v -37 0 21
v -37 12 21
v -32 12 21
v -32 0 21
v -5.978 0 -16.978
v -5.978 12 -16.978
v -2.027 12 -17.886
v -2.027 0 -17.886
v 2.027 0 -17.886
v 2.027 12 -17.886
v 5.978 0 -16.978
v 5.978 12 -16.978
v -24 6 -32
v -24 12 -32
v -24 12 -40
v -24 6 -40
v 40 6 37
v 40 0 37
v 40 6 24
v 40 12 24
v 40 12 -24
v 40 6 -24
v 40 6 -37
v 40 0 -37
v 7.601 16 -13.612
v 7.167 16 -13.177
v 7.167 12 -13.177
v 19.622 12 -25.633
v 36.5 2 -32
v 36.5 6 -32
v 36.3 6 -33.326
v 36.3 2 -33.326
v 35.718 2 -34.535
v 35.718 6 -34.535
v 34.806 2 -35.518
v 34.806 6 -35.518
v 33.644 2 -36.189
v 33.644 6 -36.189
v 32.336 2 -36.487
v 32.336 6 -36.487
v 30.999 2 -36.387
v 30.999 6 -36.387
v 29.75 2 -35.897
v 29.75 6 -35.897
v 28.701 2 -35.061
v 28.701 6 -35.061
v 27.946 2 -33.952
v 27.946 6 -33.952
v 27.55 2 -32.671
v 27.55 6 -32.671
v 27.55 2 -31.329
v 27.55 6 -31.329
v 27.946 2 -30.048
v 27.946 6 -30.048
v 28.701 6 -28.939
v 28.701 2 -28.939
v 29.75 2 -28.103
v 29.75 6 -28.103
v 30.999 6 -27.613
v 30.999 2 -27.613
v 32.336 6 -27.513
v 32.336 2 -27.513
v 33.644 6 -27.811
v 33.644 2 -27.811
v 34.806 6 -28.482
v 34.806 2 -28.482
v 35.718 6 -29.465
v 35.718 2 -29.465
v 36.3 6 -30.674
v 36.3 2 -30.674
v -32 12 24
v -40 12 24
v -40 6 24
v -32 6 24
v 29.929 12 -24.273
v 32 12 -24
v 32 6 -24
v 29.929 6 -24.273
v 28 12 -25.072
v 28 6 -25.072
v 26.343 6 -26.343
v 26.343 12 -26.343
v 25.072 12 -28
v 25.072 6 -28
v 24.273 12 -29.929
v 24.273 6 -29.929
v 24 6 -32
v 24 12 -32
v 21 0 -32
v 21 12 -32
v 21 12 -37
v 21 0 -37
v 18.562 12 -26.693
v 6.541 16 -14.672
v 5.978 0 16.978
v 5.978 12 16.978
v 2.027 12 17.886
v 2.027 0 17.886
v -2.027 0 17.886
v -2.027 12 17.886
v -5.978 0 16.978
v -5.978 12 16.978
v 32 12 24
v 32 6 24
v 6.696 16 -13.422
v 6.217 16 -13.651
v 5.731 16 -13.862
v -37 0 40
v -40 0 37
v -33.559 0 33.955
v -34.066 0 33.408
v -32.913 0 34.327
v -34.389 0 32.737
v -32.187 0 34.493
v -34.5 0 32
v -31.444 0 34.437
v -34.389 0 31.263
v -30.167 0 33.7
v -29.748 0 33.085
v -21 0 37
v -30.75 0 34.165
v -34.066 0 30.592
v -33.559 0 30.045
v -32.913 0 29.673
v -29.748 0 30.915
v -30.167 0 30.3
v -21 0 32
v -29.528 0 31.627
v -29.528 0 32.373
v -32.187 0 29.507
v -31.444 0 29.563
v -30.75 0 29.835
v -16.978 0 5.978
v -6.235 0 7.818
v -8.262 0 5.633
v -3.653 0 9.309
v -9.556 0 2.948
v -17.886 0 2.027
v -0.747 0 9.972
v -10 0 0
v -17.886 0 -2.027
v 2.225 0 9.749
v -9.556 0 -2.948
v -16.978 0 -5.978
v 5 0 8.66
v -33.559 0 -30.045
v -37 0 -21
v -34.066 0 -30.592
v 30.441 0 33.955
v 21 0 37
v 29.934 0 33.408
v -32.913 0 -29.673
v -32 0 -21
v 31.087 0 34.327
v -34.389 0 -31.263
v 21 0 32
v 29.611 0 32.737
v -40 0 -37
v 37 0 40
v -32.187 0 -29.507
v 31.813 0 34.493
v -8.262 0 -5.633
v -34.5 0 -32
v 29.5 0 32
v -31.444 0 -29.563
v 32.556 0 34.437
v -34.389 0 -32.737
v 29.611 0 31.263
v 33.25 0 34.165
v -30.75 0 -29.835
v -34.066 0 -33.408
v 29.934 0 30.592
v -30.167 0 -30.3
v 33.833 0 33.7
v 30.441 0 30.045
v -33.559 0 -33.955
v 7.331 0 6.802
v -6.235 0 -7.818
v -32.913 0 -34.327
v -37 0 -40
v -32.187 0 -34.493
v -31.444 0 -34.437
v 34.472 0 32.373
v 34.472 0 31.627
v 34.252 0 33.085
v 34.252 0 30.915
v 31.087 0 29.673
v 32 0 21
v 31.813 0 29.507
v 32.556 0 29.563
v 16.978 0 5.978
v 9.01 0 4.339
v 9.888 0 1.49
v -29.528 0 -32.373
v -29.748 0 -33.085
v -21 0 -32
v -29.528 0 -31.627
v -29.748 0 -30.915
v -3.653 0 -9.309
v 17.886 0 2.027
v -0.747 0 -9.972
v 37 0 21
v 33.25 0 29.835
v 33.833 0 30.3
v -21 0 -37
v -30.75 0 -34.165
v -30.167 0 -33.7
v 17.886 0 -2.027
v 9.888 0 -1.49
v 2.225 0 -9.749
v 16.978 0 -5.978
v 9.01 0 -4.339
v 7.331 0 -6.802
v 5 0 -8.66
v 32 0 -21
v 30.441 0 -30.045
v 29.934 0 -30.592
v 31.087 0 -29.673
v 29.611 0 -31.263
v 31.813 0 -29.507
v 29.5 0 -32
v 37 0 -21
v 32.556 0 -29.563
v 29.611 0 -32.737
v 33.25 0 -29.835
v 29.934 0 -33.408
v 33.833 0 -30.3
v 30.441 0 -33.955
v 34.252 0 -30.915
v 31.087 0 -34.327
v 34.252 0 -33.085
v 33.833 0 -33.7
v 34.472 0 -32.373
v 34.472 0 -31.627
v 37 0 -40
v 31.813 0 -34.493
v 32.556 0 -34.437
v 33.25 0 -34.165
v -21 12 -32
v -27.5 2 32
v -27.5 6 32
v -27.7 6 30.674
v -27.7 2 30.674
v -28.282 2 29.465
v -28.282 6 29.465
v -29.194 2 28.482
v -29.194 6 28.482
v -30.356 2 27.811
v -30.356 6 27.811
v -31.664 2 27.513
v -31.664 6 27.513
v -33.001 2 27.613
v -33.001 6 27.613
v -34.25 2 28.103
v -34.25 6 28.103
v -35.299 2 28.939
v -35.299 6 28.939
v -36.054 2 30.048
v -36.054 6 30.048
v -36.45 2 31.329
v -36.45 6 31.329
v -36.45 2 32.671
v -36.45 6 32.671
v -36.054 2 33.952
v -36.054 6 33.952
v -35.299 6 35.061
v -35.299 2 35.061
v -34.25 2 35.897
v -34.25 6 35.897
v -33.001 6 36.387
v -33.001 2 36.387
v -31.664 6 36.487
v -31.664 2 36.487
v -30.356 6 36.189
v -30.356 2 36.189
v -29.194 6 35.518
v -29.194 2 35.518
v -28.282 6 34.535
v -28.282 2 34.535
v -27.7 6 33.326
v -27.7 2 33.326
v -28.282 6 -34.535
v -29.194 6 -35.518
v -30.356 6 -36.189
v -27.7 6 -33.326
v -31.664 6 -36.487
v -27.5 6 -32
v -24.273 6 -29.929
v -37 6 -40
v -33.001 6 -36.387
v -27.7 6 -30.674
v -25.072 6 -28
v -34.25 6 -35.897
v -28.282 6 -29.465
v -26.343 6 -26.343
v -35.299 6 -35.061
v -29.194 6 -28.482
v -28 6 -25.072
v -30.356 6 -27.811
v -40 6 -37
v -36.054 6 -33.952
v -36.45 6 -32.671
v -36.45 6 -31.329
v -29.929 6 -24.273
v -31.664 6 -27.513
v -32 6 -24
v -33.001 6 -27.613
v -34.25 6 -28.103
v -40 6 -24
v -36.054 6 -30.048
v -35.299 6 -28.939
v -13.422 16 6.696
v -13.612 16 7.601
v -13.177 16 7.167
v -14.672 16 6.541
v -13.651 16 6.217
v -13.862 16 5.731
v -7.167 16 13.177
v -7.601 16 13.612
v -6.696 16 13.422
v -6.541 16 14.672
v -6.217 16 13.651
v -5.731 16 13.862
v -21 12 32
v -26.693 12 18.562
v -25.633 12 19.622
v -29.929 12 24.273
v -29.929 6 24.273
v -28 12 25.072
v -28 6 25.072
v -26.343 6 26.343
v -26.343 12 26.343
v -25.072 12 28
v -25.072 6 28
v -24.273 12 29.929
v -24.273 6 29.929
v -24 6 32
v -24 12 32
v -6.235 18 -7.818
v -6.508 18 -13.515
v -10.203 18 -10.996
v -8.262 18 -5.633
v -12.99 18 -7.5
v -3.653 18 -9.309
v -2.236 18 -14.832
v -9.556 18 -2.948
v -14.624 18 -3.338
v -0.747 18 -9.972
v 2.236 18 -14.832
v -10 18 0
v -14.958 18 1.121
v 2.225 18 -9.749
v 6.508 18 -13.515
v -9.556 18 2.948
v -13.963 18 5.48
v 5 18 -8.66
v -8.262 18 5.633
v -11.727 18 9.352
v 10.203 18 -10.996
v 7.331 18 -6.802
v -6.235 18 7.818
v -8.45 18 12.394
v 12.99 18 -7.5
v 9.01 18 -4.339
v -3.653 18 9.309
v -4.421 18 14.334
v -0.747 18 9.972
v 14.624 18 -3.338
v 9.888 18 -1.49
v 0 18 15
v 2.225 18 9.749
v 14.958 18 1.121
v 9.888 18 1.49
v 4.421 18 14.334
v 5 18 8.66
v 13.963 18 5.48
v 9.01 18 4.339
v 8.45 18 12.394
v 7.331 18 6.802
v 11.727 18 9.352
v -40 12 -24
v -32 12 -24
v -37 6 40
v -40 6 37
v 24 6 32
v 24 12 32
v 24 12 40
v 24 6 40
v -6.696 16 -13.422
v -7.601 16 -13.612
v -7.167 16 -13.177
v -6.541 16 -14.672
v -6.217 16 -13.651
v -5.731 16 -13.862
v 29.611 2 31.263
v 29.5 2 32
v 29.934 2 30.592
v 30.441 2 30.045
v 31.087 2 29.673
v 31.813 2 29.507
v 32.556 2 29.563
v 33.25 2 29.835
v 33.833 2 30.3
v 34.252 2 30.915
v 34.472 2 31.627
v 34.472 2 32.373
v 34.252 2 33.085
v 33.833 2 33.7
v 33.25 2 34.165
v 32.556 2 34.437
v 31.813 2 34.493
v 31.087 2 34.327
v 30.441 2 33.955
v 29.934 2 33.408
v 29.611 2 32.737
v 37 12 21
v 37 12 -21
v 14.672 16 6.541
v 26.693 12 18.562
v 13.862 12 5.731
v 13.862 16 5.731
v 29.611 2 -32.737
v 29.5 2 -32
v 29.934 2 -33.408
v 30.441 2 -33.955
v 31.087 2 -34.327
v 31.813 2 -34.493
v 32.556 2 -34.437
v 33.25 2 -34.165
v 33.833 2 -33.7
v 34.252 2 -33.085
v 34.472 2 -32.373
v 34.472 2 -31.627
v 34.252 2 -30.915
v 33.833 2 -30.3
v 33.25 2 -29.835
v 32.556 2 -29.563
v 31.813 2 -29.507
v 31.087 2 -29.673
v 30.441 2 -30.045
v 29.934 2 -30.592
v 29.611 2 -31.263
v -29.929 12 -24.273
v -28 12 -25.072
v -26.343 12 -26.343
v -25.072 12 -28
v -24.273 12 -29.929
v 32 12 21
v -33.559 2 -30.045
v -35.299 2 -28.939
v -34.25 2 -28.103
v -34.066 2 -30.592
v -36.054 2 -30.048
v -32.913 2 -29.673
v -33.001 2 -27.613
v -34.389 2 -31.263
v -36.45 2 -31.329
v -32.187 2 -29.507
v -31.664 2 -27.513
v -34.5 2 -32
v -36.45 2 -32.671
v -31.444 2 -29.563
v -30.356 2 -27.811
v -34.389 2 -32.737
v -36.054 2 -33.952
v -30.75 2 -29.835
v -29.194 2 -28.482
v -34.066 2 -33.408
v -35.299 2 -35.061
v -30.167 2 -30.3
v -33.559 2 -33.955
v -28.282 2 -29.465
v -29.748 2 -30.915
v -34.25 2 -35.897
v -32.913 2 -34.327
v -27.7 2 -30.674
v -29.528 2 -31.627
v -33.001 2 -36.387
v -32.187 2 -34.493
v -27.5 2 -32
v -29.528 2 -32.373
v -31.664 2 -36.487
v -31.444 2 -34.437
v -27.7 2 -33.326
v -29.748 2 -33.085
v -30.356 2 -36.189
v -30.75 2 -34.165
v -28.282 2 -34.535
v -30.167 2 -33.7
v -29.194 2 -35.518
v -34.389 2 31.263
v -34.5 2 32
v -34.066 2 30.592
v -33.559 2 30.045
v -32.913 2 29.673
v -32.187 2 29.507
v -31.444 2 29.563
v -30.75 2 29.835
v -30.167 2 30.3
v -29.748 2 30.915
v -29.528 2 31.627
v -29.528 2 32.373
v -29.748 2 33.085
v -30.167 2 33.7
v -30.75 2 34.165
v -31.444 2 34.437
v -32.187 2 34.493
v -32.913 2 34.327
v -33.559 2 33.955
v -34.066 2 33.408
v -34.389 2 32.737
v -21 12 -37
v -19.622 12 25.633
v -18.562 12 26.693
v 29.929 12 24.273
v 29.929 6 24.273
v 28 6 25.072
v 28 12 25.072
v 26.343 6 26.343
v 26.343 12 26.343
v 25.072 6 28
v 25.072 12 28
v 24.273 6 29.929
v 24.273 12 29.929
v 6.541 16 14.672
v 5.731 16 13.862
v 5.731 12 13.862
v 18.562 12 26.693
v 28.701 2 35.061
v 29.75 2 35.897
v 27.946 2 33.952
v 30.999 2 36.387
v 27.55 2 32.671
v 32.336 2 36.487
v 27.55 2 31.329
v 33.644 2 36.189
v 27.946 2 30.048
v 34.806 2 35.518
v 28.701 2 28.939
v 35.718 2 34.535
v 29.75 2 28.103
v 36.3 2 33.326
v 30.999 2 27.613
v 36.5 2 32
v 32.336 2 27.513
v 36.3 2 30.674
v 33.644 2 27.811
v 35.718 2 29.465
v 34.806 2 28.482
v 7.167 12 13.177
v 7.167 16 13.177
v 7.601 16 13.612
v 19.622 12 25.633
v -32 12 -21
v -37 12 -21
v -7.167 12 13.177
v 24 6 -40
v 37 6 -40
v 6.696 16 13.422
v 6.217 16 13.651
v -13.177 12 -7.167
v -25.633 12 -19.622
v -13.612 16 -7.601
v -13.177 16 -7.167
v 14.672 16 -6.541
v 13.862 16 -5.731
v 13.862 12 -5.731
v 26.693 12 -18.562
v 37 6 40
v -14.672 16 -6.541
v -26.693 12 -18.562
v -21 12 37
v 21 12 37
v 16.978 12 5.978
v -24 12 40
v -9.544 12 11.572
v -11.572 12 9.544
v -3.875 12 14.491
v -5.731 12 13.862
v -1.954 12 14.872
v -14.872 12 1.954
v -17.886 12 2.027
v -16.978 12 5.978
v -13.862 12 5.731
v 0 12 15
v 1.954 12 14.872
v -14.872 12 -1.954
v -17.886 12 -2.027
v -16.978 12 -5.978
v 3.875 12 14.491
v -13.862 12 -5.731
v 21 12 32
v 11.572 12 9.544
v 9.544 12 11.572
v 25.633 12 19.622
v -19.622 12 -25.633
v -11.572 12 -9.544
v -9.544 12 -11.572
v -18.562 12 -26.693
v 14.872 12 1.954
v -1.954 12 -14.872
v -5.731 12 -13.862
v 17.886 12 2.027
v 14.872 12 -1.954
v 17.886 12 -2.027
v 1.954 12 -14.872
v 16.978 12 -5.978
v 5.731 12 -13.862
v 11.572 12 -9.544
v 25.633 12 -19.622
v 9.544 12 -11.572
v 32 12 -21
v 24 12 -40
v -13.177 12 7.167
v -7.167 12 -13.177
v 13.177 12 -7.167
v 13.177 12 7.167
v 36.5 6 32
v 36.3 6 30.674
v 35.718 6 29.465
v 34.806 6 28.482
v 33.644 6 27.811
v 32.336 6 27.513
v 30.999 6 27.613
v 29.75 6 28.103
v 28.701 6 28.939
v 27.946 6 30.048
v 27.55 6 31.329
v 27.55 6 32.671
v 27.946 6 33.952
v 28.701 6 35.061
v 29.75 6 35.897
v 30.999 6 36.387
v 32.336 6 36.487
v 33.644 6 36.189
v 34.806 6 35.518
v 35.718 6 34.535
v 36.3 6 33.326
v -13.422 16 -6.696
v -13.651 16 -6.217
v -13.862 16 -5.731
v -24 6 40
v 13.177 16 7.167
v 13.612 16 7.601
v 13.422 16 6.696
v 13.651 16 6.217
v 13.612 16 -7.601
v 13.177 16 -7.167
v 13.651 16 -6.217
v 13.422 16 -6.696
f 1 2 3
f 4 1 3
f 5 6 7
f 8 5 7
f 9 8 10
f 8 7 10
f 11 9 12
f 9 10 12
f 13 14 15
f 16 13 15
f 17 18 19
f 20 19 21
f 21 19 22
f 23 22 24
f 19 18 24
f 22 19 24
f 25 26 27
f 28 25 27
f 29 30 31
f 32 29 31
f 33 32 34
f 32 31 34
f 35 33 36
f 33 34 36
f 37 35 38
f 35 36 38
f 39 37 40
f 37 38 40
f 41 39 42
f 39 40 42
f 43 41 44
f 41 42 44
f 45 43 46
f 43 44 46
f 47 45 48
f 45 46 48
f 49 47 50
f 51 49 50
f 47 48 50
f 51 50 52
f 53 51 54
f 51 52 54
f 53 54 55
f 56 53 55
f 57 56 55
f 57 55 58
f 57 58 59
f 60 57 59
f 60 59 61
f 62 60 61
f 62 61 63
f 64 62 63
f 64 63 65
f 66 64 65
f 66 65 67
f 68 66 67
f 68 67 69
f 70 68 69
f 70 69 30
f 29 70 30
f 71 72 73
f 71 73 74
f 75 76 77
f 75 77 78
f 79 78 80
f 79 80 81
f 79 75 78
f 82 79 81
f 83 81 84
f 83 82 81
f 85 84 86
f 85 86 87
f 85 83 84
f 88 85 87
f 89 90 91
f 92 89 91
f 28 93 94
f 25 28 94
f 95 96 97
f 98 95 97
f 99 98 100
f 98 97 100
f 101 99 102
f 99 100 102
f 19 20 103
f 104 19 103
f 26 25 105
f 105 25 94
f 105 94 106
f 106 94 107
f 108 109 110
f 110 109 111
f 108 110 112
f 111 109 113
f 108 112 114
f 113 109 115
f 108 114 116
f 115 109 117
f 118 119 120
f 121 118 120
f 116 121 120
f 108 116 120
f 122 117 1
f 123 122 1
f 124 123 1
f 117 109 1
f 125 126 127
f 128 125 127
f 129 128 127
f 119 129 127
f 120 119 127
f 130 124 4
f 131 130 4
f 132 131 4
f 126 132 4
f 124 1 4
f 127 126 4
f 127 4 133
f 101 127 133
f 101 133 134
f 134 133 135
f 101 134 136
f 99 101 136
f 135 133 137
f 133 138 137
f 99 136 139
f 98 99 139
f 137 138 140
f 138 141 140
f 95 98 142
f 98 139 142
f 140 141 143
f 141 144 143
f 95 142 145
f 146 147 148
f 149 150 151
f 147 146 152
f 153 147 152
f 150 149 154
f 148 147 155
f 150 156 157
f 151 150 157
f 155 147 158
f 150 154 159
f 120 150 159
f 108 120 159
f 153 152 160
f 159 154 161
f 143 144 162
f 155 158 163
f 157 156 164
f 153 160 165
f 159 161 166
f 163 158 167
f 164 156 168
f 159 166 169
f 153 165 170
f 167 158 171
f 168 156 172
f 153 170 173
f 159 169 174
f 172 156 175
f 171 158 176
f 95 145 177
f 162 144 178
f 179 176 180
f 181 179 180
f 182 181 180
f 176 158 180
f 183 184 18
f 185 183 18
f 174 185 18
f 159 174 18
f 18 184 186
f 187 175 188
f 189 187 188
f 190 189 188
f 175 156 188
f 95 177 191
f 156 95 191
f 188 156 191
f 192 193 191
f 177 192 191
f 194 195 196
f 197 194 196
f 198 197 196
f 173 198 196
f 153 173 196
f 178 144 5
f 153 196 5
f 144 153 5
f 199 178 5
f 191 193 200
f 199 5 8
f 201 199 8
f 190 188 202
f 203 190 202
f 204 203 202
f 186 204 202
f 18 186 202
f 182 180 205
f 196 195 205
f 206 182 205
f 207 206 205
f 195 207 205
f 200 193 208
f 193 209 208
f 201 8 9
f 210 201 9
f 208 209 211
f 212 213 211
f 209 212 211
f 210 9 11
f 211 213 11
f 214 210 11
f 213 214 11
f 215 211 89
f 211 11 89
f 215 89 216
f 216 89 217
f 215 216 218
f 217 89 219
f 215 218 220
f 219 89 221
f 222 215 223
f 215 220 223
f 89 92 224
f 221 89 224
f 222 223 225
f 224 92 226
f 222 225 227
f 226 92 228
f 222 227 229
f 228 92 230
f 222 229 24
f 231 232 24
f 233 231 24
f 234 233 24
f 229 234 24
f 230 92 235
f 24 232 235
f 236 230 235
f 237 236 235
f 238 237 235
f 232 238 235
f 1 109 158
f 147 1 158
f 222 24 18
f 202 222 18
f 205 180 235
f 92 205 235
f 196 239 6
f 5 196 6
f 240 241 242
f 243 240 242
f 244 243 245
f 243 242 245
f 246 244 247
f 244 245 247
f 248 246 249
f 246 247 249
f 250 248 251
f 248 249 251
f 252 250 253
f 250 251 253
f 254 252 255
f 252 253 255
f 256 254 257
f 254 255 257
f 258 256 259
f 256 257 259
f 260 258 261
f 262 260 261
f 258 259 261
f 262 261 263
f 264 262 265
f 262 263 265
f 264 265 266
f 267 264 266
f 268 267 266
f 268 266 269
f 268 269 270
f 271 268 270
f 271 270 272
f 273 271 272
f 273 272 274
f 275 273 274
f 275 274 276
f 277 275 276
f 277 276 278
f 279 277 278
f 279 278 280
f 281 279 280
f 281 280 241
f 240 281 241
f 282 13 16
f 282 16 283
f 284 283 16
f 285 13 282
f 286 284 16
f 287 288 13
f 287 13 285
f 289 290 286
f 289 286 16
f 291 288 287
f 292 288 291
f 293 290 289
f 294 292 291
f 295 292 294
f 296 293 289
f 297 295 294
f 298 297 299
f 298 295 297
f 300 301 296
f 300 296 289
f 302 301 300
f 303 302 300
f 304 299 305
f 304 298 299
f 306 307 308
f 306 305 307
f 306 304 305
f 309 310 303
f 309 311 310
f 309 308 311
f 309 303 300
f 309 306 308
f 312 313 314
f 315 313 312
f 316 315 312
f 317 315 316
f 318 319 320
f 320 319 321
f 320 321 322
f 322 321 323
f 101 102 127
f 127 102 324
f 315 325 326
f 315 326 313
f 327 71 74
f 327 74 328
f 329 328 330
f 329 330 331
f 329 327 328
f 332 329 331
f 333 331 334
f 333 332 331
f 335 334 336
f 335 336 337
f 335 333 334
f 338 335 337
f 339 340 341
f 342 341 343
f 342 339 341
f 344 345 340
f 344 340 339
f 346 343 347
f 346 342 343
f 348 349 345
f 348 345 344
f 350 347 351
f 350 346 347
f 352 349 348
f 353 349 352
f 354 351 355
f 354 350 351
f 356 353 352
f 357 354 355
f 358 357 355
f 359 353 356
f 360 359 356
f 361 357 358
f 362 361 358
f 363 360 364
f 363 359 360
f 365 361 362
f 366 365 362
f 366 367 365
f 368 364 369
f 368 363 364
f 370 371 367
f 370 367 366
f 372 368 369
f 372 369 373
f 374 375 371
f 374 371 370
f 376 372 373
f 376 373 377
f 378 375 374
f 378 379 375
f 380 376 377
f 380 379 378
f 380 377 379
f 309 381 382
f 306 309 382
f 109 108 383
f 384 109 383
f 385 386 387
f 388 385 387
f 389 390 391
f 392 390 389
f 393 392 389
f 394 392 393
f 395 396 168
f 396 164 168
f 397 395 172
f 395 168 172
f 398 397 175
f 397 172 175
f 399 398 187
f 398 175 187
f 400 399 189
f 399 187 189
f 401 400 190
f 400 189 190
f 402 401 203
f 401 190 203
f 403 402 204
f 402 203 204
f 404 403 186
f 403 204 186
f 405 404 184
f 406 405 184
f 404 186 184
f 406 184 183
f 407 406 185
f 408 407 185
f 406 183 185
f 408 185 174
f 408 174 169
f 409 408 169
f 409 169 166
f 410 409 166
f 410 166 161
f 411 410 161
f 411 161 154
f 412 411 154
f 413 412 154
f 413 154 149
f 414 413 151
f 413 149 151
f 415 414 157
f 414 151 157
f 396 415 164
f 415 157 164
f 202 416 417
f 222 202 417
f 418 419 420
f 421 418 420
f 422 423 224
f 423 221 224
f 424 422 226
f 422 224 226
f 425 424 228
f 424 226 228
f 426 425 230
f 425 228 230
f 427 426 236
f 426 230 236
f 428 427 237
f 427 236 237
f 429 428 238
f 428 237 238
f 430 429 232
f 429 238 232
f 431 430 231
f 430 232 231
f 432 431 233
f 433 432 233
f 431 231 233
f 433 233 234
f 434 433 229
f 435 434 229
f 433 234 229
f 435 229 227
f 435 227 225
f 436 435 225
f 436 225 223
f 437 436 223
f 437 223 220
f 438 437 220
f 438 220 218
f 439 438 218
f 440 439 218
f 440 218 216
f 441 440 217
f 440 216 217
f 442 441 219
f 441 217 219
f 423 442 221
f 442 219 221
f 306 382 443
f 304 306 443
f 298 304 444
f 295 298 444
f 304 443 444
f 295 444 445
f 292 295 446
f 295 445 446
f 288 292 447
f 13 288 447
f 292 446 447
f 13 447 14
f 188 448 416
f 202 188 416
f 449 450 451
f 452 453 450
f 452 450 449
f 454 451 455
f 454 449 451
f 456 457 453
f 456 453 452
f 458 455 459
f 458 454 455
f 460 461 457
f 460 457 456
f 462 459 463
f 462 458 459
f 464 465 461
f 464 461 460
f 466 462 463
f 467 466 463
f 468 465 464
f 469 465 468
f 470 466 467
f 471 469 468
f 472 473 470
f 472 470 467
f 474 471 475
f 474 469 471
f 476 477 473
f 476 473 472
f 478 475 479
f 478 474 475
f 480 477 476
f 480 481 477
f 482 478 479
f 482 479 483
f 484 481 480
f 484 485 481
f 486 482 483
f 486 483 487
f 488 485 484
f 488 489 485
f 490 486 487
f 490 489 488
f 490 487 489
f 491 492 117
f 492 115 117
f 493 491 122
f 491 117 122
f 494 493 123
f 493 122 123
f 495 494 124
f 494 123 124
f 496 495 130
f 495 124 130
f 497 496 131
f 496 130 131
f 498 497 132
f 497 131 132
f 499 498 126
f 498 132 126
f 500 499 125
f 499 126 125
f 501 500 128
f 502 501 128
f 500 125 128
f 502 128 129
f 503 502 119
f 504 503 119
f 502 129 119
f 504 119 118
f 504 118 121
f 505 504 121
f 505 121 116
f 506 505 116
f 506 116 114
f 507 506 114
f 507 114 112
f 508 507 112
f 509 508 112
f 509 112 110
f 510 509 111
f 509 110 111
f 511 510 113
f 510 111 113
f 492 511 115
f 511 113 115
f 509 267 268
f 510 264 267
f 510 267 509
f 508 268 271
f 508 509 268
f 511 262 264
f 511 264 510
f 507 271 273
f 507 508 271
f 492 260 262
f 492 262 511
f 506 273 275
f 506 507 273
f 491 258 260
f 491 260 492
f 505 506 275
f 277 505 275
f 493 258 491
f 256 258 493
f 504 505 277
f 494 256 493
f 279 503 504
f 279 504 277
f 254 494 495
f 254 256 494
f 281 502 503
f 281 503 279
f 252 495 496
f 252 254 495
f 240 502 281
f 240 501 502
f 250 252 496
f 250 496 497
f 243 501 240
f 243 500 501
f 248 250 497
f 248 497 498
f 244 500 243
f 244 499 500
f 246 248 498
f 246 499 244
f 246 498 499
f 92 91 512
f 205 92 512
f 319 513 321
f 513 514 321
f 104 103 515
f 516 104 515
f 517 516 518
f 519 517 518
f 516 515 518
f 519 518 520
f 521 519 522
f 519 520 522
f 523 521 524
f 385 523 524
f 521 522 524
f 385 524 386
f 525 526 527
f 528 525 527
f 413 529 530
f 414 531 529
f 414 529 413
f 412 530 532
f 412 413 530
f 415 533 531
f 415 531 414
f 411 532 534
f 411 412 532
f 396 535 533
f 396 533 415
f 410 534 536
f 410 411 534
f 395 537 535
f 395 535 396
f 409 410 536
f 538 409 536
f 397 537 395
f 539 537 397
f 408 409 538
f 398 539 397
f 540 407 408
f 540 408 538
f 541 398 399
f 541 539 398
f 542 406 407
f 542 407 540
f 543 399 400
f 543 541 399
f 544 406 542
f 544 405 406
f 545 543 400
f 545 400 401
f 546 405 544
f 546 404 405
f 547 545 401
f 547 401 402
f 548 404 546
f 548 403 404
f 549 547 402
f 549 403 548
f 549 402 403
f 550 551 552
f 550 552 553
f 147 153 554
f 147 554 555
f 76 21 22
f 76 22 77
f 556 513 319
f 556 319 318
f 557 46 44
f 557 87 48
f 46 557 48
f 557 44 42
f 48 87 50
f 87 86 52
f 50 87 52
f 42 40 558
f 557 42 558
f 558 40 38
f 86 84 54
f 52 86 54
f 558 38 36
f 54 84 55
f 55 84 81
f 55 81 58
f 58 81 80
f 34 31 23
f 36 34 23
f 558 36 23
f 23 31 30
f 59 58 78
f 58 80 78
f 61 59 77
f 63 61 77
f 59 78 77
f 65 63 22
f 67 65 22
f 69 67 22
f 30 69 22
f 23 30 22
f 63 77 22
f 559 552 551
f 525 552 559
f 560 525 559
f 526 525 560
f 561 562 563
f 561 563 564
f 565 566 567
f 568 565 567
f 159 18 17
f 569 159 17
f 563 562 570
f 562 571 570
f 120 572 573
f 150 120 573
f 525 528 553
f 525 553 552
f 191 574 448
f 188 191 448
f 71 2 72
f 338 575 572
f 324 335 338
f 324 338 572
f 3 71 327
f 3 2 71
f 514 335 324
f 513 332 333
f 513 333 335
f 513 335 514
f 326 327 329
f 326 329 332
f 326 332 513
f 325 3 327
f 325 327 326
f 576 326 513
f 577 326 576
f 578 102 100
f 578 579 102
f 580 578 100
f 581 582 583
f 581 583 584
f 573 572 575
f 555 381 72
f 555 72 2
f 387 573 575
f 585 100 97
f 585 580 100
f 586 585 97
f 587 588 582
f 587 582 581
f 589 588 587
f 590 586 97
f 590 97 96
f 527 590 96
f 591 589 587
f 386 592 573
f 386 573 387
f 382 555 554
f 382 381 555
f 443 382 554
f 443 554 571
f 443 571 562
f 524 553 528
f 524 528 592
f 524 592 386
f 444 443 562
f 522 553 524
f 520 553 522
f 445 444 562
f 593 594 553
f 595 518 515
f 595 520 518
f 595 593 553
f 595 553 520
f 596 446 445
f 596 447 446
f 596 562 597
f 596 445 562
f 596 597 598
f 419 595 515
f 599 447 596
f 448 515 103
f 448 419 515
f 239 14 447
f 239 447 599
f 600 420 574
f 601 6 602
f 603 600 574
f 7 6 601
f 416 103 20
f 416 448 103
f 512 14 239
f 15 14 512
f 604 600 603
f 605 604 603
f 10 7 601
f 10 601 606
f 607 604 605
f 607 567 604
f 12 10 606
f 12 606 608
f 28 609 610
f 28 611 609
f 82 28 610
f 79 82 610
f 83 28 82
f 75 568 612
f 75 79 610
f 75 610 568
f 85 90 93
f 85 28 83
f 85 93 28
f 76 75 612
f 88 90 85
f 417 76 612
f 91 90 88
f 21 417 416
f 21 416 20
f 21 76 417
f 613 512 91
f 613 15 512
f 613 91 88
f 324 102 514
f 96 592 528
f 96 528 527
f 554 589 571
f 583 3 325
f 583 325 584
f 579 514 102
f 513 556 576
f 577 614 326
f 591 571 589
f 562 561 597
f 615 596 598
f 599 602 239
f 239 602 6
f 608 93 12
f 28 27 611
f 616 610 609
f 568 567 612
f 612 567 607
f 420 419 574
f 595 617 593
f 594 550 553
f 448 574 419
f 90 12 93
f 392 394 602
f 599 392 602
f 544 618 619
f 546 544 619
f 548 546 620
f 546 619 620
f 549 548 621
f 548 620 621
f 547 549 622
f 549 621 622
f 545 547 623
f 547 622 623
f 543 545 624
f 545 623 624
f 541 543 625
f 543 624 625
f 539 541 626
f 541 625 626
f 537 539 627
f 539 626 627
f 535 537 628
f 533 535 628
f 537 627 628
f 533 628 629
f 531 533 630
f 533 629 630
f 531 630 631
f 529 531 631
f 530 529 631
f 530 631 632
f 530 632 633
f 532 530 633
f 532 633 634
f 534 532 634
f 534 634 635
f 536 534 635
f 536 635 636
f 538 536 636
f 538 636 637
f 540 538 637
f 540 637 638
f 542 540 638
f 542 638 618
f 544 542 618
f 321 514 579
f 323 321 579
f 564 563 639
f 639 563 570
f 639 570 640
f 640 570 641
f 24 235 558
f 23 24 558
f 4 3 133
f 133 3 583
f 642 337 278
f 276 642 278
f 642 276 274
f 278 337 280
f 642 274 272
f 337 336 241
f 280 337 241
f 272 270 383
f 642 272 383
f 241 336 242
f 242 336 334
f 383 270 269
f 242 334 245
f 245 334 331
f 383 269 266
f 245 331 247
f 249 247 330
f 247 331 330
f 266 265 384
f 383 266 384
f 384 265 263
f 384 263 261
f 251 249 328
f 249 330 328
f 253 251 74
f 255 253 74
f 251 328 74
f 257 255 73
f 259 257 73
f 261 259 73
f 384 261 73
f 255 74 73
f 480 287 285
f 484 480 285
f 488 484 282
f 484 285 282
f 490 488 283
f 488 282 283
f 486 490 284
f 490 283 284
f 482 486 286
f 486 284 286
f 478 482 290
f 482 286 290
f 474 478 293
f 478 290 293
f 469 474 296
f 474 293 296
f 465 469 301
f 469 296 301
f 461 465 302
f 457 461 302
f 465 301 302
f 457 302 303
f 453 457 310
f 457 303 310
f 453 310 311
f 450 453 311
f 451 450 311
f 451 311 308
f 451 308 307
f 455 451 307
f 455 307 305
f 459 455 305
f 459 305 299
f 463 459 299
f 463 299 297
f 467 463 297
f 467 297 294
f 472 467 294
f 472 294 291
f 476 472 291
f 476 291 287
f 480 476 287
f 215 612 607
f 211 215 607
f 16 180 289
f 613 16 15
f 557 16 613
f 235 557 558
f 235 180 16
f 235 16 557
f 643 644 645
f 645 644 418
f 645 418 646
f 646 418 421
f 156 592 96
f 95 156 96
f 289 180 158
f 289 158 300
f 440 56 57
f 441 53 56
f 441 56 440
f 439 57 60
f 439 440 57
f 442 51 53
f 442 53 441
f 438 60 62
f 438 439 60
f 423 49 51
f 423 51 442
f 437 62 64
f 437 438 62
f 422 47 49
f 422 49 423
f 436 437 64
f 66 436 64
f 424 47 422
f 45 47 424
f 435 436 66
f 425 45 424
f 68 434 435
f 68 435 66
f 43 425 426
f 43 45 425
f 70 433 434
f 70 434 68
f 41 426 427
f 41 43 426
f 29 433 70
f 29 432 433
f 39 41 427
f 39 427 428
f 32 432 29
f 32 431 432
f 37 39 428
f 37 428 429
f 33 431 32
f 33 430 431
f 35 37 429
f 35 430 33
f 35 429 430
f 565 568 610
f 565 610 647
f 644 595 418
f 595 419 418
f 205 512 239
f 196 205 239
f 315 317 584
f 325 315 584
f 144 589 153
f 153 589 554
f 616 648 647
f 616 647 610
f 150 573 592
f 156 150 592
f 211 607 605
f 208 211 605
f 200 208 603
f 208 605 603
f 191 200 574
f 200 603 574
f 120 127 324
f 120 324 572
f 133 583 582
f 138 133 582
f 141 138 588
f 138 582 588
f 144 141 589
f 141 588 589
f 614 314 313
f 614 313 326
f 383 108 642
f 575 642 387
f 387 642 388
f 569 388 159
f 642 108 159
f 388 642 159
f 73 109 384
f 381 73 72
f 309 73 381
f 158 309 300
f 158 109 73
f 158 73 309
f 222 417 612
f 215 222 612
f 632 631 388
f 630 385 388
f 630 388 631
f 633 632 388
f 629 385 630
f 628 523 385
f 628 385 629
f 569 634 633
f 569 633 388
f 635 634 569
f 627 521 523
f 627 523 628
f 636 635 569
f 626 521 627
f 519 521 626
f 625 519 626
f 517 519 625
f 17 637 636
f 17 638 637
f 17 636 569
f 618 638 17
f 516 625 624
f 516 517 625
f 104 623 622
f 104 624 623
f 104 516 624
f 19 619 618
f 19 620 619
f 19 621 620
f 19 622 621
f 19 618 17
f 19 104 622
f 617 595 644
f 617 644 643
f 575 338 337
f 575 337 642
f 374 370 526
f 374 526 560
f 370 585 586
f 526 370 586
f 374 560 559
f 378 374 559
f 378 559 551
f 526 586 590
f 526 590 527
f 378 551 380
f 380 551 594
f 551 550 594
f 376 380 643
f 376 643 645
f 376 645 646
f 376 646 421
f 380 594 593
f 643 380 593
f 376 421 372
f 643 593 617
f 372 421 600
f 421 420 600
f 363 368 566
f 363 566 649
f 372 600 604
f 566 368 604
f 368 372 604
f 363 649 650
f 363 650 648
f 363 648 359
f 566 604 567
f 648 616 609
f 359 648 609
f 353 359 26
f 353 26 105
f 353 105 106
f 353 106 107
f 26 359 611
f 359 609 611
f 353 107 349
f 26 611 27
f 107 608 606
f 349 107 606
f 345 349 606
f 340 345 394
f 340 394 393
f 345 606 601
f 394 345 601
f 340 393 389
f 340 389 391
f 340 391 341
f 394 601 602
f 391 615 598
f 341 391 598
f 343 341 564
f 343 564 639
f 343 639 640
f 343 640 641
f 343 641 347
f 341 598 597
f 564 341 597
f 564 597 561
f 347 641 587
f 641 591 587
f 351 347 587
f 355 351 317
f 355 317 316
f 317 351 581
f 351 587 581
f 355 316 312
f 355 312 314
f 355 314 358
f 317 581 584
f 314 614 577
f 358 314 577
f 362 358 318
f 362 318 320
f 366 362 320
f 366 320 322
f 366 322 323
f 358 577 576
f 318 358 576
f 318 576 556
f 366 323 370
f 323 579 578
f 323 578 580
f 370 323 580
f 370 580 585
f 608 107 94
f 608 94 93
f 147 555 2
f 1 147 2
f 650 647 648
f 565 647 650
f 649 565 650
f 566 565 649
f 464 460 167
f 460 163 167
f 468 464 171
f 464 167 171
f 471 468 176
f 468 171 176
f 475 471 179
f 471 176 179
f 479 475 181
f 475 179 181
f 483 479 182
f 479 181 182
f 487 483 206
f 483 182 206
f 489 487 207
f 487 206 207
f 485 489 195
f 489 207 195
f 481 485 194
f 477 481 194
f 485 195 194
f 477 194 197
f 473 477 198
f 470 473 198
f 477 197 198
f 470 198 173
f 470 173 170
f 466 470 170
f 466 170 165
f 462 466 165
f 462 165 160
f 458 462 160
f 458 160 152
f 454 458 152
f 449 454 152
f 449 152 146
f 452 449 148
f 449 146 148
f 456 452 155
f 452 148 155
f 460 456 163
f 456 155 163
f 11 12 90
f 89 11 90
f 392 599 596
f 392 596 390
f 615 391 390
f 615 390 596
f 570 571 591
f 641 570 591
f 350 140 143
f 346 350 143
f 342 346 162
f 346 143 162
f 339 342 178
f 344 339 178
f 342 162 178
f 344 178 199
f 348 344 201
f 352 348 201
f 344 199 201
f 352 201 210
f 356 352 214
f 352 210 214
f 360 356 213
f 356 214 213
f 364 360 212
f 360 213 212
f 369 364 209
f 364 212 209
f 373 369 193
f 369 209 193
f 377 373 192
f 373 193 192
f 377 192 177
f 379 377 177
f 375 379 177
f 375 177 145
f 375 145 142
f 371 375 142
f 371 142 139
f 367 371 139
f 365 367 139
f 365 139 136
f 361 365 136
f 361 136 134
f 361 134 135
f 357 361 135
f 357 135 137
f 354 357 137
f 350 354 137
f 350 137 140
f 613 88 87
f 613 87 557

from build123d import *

# Parameters (mm, degrees)
SKETCH1_W                = 80
SKETCH1_H                = 80
BOSS_EXTRUDE1_DEPTH      = 12
CHAMFER1_SIZE            = 3
CUT_EXTRUDE1_DEPTH       = 6
MIRROR2_COPY_1_DEPTH     = 6
HOLE3_D                  = 5
HOLE3_CBORE_D            = 9
HOLE3_CBORE_DEPTH        = 4
SKETCH9_R                = 15
BOSS_EXTRUDE2_DEPTH      = 6
CUT_EXTRUDE2_DEPTH       = 60.363288319
CIRPATTERN1_COUNT        = 4
BOSS_EXTRUDE3_START      = 5
BOSS_EXTRUDE3_DEPTH      = 0.75
CIRPATTERN2_COUNT        = 4
CIRPATTERN2_START        = 5
CIRPATTERN2_COPY_1_DEPTH = 0.75
CIRPATTERN2_COPY_2_DEPTH = 0.75
CIRPATTERN2_COPY_3_DEPTH = 0.75
HOLE4_D                  = 20


with BuildPart() as part:
    # Sketch1 → Boss-Extrude1 (new body)
    with BuildSketch(Plane(origin=(0, 0, 0), x_dir=(1, 0, 0), z_dir=(0, 1, 0))):
        Rectangle(SKETCH1_W, SKETCH1_H)
    extrude(amount=BOSS_EXTRUDE1_DEPTH)

    # Chamfer1
    chamfer1_edges = [part.edges().sort_by_distance(p)[0] for p in [
        (40, 6, 40),
        (-40, 6, 40),
        (-40, 6, -40),
        (40, 6, -40),
    ]]
    chamfer(chamfer1_edges, length=CHAMFER1_SIZE)

    # Sketch2 → Cut-Extrude1 (cut)
    with BuildSketch(Plane(origin=(0, 12, 0), x_dir=(1, 0, 0), z_dir=(0, 1, 0))):
        with BuildLine():
            Line((-40, -24), (-32, -24))
            ThreePointArc((-32, -24), (-26.343145751, -26.343145751), (-24, -32))
            Line((-24, -32), (-24, -40))
            Line((-24, -40), (-37, -40))
            Line((-37, -40), (-40, -37))
            Line((-40, -37), (-40, -24))
        make_face()
    cut_extrude1 = extrude(amount=-CUT_EXTRUDE1_DEPTH, mode=Mode.SUBTRACT)

    # Mirror1: Cut-Extrude1 across plane
    add(cut_extrude1.mirror(Plane(origin=(0, 0, 0), x_dir=(0, 0, 1), z_dir=(1, 0, 0))), mode=Mode.SUBTRACT)

    # Mirror2: Cut-Extrude1 across plane
    add(cut_extrude1.mirror(Plane.XY), mode=Mode.SUBTRACT)

    # Mirror2 copy 1 sketch → Mirror2 copy 1 (cut)
    with BuildSketch(Plane(origin=(0, 12, 0), x_dir=(-1, 0, 0), z_dir=(0, 1, 0))):
        with BuildLine():
            Line((-40, -24), (-32, -24))
            ThreePointArc((-32, -24), (-26.343145751, -26.343145751), (-24, -32))
            Line((-24, -32), (-24, -40))
            Line((-24, -40), (-37, -40))
            Line((-37, -40), (-40, -37))
            Line((-40, -37), (-40, -24))
        make_face()
    extrude(amount=-MIRROR2_COPY_1_DEPTH, mode=Mode.SUBTRACT)

    # Hole3 (through all)
    with Locations(Plane(origin=(0, 6, 0), x_dir=(1, 0, 0), z_dir=(0, 1, 0))):
        with Locations((-32, -32), (32, -32), (32, 32), (-32, 32)):
            CounterBoreHole(HOLE3_D / 2, HOLE3_CBORE_D / 2, HOLE3_CBORE_DEPTH)

    # Sketch9 → Boss-Extrude2 (add)
    with BuildSketch(Plane(origin=(0, 12, 0), x_dir=(1, 0, 0), z_dir=(0, 1, 0))):
        with Locations(Location((0, 0, 0), (0, 0, 270))):
            Circle(SKETCH9_R)
    extrude(amount=BOSS_EXTRUDE2_DEPTH)

    # Sketch10 → Cut-Extrude2 (cut, through all)
    with BuildSketch(Plane(origin=(0, 18, 0), x_dir=(1, 0, 0), z_dir=(0, 1, 0))):
        with BuildLine():
            Line((-21, 37), (-21, 32))
            Line((-21, 32), (-5.978240283, 16.978240283))
            ThreePointArc((-5.978240283, 16.978240283), (0, 18), (5.978240283, 16.978240283))
            Line((5.978240283, 16.978240283), (21, 32))
            Line((21, 32), (21, 37))
            Line((21, 37), (-21, 37))
        make_face()
    cut_extrude2 = extrude(amount=-CUT_EXTRUDE2_DEPTH, mode=Mode.SUBTRACT)

    # CirPattern1: Cut-Extrude2 ×4 about axis
    cirpattern1_axis = Axis((0, 0, 0), (0, 1, 0))
    for i in range(1, CIRPATTERN1_COUNT):
        add(cut_extrude2.rotate(cirpattern1_axis, i * 360 / CIRPATTERN1_COUNT), mode=Mode.SUBTRACT)

    # Sketch12 → Boss-Extrude3 (add, symmetric)
    with BuildSketch(Plane(origin=(0, 0, 0), x_dir=(0.7071067811865491, 0, -0.707106781186546), z_dir=(0.707106781186546, 0, 0.7071067811865491)).offset(BOSS_EXTRUDE3_START)):
        Polygon((12, 12), (32, 12), (15, 16), (12, 16), align=None)
    boss_extrude3 = extrude(amount=BOSS_EXTRUDE3_DEPTH, both=True)

    # Mirror4: Boss-Extrude3 across plane
    add(boss_extrude3.mirror(Plane(origin=(0, 0, 0), x_dir=(-0.7071067811865492, 0, 0.7071067811865459), z_dir=(0.707106781186546, 0, 0.7071067811865491))))

    # CirPattern2: Boss-Extrude3 ×4 about axis
    cirpattern2_axis = Axis((0, 0, 0), (0, 1, 0))
    for i in range(1, CIRPATTERN2_COUNT):
        add(boss_extrude3.rotate(cirpattern2_axis, i * 360 / CIRPATTERN2_COUNT))

    # CirPattern2 copy 1 sketch → CirPattern2 copy 1 (add, symmetric)
    with BuildSketch(Plane(origin=(0, 0, 0), x_dir=(-0.707106781186546, 0, -0.7071067811865491), z_dir=(-0.7071067811865493, 0, 0.7071067811865462)).offset(CIRPATTERN2_START)):
        Polygon((12, -12), (32, -12), (15, -16), (12, -16), align=None)
    extrude(amount=CIRPATTERN2_COPY_1_DEPTH, both=True)

    # CirPattern2 copy 2 sketch → CirPattern2 copy 2 (add, symmetric)
    with BuildSketch(Plane(origin=(0, 0, 0), x_dir=(-0.7071067811865492, 0, 0.707106781186546), z_dir=(0.7071067811865461, 0, 0.7071067811865493)).offset(CIRPATTERN2_START)):
        Polygon((12, -12), (32, -12), (15, -16), (12, -16), align=None)
    extrude(amount=CIRPATTERN2_COPY_2_DEPTH, both=True)

    # CirPattern2 copy 3 sketch → CirPattern2 copy 3 (add, symmetric)
    with BuildSketch(Plane(origin=(0, 0, 0), x_dir=(0.707106781186546, 0, 0.7071067811865492), z_dir=(0.7071067811865493, 0, -0.7071067811865461)).offset(CIRPATTERN2_START)):
        Polygon((12, -12), (32, -12), (15, -16), (12, -16), align=None)
    extrude(amount=CIRPATTERN2_COPY_3_DEPTH, both=True)

    # Hole4 (through all)
    with Locations(Plane(origin=(0, 18, 0), x_dir=(1, 0, 0), z_dir=(0, 1, 0))):
        with Locations((0, 0)):
            Hole(HOLE4_D / 2)


solid = part.part
